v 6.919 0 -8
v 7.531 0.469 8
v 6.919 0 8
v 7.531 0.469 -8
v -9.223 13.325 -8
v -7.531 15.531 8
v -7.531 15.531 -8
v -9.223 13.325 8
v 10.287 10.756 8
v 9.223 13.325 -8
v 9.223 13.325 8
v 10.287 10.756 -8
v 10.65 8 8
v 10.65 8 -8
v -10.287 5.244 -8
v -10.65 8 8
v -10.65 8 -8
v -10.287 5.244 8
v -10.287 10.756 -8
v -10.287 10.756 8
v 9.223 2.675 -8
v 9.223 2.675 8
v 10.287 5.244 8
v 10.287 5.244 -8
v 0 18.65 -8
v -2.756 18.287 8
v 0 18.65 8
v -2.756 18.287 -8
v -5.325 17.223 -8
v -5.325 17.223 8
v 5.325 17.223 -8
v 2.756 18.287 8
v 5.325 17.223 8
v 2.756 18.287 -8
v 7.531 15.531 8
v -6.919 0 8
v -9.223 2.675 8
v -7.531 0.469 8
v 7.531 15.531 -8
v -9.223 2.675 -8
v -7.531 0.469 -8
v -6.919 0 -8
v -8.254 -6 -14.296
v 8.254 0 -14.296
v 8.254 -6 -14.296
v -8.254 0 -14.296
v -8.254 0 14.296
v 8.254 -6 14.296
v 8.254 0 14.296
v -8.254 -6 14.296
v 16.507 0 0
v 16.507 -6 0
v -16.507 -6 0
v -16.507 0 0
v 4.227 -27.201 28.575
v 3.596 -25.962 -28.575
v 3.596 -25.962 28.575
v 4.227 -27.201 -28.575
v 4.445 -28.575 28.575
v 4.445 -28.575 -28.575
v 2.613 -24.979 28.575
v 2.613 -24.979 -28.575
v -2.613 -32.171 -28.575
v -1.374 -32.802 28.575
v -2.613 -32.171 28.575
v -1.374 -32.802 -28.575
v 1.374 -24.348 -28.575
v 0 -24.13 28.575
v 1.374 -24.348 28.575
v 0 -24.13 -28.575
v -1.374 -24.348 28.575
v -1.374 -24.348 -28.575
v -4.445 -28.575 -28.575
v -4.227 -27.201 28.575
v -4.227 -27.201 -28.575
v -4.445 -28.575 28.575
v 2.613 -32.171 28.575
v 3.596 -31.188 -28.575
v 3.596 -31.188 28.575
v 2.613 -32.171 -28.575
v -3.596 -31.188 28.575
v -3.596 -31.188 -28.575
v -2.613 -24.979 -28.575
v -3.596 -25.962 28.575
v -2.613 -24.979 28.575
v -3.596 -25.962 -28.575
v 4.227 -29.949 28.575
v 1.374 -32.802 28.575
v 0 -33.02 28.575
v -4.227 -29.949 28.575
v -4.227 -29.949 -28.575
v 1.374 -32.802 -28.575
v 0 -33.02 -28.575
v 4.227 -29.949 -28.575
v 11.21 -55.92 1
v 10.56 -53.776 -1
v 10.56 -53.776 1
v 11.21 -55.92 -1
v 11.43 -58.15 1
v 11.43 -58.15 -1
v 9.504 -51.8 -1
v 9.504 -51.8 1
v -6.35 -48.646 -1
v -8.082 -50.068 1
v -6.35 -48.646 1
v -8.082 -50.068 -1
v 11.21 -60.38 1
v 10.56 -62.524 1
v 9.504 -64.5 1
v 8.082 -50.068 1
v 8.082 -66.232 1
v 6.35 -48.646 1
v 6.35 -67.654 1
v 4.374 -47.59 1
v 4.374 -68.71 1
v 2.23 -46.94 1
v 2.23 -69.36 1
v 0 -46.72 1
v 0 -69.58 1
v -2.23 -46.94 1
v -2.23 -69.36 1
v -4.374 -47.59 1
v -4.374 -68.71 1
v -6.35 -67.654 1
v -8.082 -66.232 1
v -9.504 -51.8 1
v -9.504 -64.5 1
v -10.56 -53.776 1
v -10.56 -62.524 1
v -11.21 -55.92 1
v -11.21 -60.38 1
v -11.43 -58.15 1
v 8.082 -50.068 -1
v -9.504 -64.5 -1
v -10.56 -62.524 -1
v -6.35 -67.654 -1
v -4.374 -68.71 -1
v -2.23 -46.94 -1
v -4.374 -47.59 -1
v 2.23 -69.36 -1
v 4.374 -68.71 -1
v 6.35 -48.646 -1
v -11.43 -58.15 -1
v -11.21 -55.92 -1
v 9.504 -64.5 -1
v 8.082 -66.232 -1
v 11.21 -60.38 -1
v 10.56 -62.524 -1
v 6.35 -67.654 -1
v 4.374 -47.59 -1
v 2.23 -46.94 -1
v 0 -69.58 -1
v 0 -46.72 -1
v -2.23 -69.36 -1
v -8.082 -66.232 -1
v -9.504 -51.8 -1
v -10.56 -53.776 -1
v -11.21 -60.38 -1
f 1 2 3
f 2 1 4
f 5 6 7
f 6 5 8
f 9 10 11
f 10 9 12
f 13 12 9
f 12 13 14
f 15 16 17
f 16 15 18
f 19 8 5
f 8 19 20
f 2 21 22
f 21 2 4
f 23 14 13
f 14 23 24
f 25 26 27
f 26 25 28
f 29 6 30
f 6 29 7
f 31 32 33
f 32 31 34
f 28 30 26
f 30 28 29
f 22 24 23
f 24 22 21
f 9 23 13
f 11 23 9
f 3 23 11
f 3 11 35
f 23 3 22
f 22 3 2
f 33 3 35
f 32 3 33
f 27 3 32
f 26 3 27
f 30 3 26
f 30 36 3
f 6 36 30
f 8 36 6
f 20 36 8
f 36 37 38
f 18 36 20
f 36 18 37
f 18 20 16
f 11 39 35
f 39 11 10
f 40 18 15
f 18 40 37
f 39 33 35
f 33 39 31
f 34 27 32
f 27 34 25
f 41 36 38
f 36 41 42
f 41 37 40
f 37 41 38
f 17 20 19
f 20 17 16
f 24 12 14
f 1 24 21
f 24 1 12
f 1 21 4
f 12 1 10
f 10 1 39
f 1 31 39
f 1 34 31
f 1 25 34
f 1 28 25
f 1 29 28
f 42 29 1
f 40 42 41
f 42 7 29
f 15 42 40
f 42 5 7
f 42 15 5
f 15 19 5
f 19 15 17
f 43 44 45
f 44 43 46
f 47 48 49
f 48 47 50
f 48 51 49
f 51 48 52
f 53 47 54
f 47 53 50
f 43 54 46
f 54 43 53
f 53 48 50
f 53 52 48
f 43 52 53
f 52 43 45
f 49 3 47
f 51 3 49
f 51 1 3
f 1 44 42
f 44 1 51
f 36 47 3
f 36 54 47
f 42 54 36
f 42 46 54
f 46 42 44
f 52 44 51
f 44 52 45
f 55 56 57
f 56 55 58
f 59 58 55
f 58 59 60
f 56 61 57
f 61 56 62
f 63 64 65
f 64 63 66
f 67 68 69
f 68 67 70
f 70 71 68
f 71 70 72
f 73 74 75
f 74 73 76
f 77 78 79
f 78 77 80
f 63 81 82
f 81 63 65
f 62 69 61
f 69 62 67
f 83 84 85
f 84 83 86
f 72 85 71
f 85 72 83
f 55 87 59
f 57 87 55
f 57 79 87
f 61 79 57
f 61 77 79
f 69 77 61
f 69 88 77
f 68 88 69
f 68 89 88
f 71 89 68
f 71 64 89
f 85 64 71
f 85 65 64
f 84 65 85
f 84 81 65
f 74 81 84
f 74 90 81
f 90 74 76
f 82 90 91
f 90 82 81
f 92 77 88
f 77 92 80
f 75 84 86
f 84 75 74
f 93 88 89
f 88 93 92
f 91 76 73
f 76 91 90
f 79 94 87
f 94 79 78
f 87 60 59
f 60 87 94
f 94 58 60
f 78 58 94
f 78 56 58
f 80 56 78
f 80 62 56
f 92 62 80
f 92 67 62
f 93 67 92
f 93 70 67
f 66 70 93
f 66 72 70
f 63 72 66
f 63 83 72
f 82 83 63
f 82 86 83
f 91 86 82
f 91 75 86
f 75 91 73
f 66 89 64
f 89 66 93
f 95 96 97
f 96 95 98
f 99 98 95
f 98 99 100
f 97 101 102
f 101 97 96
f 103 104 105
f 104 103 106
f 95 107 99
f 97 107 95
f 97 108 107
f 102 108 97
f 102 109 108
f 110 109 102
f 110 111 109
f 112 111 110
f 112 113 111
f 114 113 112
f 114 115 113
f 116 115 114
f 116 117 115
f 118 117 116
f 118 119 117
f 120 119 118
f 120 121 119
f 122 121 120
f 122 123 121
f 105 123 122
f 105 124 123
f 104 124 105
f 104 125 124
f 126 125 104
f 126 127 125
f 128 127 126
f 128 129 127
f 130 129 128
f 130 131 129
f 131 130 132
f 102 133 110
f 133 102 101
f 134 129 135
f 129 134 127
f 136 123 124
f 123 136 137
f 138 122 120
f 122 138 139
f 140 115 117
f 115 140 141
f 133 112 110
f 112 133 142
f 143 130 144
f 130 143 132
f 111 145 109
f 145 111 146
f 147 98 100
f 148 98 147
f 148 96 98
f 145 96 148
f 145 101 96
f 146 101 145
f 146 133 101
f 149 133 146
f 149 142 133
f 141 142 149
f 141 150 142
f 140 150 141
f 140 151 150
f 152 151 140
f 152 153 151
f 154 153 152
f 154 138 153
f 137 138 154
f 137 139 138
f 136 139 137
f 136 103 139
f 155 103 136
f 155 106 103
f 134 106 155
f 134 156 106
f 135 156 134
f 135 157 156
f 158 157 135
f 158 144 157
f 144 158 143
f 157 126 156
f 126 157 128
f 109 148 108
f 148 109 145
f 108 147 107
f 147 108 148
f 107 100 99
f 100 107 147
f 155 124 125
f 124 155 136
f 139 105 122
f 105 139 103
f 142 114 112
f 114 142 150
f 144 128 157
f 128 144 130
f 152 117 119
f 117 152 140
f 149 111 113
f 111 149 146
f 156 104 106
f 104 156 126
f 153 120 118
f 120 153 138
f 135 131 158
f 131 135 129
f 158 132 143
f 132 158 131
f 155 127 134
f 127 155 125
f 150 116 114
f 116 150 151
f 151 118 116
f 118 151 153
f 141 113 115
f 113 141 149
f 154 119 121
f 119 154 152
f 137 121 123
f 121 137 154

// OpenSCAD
// Auto-generated by scripts/author_from_manifest.py (Phase D.3).
// Source: data/phase_d_manifest.json (sku_intent='tyco-ty1234-qr-pendent-286f').
// Do not hand-edit — regenerate from the manifest.
//
// @part tyco_ty1234_qr_pendent_286f
// @kind sprinkler_head
// @category head.pendant.k56
// @display-name "Tyco TY1234 Quick-Response Pendent K5.6 286°F"
// @mfg tyco_fire_protection
// @mfg-pn TY1234
// @listing UL FM
// @hazard-classes LH OH1
// @price-usd 15.25
// @install-minutes 8
// @crew journeyman
// @k-factor 5.6
// @orientation pendant
// @response quick
// @temperature 286F
// @param size_in number default=0.5 label="Size" unit="in"
// @port inlet position=[0,0.014,0] direction=[0,1,0] style=NPT_threaded size_in=0.5 role=drop

size_in = 0.5;
k_factor = 5.6;

length_mm   = 57.15;
body_dia_mm = 25.40;
thread_od   = 21.3;
thread_len  = 16;
deflector_d = body_dia_mm * 0.9;

 union() {
    translate([0, thread_len/2, 0])
        cylinder(h = thread_len, d = thread_od, center = true, $fn = 24);
    translate([0, -3, 0])
        rotate([90, 0, 0])
        cylinder(h = 6, d = thread_od * 1.55, $fn = 6, center = true);
    translate([0, -length_mm/2, 0])
        cylinder(h = length_mm, d = body_dia_mm * 0.35, center = true, $fn = 20);
    translate([0, -length_mm - 1, 0])
        cylinder(h = 2, d = deflector_d, center = true, $fn = 32);
}
